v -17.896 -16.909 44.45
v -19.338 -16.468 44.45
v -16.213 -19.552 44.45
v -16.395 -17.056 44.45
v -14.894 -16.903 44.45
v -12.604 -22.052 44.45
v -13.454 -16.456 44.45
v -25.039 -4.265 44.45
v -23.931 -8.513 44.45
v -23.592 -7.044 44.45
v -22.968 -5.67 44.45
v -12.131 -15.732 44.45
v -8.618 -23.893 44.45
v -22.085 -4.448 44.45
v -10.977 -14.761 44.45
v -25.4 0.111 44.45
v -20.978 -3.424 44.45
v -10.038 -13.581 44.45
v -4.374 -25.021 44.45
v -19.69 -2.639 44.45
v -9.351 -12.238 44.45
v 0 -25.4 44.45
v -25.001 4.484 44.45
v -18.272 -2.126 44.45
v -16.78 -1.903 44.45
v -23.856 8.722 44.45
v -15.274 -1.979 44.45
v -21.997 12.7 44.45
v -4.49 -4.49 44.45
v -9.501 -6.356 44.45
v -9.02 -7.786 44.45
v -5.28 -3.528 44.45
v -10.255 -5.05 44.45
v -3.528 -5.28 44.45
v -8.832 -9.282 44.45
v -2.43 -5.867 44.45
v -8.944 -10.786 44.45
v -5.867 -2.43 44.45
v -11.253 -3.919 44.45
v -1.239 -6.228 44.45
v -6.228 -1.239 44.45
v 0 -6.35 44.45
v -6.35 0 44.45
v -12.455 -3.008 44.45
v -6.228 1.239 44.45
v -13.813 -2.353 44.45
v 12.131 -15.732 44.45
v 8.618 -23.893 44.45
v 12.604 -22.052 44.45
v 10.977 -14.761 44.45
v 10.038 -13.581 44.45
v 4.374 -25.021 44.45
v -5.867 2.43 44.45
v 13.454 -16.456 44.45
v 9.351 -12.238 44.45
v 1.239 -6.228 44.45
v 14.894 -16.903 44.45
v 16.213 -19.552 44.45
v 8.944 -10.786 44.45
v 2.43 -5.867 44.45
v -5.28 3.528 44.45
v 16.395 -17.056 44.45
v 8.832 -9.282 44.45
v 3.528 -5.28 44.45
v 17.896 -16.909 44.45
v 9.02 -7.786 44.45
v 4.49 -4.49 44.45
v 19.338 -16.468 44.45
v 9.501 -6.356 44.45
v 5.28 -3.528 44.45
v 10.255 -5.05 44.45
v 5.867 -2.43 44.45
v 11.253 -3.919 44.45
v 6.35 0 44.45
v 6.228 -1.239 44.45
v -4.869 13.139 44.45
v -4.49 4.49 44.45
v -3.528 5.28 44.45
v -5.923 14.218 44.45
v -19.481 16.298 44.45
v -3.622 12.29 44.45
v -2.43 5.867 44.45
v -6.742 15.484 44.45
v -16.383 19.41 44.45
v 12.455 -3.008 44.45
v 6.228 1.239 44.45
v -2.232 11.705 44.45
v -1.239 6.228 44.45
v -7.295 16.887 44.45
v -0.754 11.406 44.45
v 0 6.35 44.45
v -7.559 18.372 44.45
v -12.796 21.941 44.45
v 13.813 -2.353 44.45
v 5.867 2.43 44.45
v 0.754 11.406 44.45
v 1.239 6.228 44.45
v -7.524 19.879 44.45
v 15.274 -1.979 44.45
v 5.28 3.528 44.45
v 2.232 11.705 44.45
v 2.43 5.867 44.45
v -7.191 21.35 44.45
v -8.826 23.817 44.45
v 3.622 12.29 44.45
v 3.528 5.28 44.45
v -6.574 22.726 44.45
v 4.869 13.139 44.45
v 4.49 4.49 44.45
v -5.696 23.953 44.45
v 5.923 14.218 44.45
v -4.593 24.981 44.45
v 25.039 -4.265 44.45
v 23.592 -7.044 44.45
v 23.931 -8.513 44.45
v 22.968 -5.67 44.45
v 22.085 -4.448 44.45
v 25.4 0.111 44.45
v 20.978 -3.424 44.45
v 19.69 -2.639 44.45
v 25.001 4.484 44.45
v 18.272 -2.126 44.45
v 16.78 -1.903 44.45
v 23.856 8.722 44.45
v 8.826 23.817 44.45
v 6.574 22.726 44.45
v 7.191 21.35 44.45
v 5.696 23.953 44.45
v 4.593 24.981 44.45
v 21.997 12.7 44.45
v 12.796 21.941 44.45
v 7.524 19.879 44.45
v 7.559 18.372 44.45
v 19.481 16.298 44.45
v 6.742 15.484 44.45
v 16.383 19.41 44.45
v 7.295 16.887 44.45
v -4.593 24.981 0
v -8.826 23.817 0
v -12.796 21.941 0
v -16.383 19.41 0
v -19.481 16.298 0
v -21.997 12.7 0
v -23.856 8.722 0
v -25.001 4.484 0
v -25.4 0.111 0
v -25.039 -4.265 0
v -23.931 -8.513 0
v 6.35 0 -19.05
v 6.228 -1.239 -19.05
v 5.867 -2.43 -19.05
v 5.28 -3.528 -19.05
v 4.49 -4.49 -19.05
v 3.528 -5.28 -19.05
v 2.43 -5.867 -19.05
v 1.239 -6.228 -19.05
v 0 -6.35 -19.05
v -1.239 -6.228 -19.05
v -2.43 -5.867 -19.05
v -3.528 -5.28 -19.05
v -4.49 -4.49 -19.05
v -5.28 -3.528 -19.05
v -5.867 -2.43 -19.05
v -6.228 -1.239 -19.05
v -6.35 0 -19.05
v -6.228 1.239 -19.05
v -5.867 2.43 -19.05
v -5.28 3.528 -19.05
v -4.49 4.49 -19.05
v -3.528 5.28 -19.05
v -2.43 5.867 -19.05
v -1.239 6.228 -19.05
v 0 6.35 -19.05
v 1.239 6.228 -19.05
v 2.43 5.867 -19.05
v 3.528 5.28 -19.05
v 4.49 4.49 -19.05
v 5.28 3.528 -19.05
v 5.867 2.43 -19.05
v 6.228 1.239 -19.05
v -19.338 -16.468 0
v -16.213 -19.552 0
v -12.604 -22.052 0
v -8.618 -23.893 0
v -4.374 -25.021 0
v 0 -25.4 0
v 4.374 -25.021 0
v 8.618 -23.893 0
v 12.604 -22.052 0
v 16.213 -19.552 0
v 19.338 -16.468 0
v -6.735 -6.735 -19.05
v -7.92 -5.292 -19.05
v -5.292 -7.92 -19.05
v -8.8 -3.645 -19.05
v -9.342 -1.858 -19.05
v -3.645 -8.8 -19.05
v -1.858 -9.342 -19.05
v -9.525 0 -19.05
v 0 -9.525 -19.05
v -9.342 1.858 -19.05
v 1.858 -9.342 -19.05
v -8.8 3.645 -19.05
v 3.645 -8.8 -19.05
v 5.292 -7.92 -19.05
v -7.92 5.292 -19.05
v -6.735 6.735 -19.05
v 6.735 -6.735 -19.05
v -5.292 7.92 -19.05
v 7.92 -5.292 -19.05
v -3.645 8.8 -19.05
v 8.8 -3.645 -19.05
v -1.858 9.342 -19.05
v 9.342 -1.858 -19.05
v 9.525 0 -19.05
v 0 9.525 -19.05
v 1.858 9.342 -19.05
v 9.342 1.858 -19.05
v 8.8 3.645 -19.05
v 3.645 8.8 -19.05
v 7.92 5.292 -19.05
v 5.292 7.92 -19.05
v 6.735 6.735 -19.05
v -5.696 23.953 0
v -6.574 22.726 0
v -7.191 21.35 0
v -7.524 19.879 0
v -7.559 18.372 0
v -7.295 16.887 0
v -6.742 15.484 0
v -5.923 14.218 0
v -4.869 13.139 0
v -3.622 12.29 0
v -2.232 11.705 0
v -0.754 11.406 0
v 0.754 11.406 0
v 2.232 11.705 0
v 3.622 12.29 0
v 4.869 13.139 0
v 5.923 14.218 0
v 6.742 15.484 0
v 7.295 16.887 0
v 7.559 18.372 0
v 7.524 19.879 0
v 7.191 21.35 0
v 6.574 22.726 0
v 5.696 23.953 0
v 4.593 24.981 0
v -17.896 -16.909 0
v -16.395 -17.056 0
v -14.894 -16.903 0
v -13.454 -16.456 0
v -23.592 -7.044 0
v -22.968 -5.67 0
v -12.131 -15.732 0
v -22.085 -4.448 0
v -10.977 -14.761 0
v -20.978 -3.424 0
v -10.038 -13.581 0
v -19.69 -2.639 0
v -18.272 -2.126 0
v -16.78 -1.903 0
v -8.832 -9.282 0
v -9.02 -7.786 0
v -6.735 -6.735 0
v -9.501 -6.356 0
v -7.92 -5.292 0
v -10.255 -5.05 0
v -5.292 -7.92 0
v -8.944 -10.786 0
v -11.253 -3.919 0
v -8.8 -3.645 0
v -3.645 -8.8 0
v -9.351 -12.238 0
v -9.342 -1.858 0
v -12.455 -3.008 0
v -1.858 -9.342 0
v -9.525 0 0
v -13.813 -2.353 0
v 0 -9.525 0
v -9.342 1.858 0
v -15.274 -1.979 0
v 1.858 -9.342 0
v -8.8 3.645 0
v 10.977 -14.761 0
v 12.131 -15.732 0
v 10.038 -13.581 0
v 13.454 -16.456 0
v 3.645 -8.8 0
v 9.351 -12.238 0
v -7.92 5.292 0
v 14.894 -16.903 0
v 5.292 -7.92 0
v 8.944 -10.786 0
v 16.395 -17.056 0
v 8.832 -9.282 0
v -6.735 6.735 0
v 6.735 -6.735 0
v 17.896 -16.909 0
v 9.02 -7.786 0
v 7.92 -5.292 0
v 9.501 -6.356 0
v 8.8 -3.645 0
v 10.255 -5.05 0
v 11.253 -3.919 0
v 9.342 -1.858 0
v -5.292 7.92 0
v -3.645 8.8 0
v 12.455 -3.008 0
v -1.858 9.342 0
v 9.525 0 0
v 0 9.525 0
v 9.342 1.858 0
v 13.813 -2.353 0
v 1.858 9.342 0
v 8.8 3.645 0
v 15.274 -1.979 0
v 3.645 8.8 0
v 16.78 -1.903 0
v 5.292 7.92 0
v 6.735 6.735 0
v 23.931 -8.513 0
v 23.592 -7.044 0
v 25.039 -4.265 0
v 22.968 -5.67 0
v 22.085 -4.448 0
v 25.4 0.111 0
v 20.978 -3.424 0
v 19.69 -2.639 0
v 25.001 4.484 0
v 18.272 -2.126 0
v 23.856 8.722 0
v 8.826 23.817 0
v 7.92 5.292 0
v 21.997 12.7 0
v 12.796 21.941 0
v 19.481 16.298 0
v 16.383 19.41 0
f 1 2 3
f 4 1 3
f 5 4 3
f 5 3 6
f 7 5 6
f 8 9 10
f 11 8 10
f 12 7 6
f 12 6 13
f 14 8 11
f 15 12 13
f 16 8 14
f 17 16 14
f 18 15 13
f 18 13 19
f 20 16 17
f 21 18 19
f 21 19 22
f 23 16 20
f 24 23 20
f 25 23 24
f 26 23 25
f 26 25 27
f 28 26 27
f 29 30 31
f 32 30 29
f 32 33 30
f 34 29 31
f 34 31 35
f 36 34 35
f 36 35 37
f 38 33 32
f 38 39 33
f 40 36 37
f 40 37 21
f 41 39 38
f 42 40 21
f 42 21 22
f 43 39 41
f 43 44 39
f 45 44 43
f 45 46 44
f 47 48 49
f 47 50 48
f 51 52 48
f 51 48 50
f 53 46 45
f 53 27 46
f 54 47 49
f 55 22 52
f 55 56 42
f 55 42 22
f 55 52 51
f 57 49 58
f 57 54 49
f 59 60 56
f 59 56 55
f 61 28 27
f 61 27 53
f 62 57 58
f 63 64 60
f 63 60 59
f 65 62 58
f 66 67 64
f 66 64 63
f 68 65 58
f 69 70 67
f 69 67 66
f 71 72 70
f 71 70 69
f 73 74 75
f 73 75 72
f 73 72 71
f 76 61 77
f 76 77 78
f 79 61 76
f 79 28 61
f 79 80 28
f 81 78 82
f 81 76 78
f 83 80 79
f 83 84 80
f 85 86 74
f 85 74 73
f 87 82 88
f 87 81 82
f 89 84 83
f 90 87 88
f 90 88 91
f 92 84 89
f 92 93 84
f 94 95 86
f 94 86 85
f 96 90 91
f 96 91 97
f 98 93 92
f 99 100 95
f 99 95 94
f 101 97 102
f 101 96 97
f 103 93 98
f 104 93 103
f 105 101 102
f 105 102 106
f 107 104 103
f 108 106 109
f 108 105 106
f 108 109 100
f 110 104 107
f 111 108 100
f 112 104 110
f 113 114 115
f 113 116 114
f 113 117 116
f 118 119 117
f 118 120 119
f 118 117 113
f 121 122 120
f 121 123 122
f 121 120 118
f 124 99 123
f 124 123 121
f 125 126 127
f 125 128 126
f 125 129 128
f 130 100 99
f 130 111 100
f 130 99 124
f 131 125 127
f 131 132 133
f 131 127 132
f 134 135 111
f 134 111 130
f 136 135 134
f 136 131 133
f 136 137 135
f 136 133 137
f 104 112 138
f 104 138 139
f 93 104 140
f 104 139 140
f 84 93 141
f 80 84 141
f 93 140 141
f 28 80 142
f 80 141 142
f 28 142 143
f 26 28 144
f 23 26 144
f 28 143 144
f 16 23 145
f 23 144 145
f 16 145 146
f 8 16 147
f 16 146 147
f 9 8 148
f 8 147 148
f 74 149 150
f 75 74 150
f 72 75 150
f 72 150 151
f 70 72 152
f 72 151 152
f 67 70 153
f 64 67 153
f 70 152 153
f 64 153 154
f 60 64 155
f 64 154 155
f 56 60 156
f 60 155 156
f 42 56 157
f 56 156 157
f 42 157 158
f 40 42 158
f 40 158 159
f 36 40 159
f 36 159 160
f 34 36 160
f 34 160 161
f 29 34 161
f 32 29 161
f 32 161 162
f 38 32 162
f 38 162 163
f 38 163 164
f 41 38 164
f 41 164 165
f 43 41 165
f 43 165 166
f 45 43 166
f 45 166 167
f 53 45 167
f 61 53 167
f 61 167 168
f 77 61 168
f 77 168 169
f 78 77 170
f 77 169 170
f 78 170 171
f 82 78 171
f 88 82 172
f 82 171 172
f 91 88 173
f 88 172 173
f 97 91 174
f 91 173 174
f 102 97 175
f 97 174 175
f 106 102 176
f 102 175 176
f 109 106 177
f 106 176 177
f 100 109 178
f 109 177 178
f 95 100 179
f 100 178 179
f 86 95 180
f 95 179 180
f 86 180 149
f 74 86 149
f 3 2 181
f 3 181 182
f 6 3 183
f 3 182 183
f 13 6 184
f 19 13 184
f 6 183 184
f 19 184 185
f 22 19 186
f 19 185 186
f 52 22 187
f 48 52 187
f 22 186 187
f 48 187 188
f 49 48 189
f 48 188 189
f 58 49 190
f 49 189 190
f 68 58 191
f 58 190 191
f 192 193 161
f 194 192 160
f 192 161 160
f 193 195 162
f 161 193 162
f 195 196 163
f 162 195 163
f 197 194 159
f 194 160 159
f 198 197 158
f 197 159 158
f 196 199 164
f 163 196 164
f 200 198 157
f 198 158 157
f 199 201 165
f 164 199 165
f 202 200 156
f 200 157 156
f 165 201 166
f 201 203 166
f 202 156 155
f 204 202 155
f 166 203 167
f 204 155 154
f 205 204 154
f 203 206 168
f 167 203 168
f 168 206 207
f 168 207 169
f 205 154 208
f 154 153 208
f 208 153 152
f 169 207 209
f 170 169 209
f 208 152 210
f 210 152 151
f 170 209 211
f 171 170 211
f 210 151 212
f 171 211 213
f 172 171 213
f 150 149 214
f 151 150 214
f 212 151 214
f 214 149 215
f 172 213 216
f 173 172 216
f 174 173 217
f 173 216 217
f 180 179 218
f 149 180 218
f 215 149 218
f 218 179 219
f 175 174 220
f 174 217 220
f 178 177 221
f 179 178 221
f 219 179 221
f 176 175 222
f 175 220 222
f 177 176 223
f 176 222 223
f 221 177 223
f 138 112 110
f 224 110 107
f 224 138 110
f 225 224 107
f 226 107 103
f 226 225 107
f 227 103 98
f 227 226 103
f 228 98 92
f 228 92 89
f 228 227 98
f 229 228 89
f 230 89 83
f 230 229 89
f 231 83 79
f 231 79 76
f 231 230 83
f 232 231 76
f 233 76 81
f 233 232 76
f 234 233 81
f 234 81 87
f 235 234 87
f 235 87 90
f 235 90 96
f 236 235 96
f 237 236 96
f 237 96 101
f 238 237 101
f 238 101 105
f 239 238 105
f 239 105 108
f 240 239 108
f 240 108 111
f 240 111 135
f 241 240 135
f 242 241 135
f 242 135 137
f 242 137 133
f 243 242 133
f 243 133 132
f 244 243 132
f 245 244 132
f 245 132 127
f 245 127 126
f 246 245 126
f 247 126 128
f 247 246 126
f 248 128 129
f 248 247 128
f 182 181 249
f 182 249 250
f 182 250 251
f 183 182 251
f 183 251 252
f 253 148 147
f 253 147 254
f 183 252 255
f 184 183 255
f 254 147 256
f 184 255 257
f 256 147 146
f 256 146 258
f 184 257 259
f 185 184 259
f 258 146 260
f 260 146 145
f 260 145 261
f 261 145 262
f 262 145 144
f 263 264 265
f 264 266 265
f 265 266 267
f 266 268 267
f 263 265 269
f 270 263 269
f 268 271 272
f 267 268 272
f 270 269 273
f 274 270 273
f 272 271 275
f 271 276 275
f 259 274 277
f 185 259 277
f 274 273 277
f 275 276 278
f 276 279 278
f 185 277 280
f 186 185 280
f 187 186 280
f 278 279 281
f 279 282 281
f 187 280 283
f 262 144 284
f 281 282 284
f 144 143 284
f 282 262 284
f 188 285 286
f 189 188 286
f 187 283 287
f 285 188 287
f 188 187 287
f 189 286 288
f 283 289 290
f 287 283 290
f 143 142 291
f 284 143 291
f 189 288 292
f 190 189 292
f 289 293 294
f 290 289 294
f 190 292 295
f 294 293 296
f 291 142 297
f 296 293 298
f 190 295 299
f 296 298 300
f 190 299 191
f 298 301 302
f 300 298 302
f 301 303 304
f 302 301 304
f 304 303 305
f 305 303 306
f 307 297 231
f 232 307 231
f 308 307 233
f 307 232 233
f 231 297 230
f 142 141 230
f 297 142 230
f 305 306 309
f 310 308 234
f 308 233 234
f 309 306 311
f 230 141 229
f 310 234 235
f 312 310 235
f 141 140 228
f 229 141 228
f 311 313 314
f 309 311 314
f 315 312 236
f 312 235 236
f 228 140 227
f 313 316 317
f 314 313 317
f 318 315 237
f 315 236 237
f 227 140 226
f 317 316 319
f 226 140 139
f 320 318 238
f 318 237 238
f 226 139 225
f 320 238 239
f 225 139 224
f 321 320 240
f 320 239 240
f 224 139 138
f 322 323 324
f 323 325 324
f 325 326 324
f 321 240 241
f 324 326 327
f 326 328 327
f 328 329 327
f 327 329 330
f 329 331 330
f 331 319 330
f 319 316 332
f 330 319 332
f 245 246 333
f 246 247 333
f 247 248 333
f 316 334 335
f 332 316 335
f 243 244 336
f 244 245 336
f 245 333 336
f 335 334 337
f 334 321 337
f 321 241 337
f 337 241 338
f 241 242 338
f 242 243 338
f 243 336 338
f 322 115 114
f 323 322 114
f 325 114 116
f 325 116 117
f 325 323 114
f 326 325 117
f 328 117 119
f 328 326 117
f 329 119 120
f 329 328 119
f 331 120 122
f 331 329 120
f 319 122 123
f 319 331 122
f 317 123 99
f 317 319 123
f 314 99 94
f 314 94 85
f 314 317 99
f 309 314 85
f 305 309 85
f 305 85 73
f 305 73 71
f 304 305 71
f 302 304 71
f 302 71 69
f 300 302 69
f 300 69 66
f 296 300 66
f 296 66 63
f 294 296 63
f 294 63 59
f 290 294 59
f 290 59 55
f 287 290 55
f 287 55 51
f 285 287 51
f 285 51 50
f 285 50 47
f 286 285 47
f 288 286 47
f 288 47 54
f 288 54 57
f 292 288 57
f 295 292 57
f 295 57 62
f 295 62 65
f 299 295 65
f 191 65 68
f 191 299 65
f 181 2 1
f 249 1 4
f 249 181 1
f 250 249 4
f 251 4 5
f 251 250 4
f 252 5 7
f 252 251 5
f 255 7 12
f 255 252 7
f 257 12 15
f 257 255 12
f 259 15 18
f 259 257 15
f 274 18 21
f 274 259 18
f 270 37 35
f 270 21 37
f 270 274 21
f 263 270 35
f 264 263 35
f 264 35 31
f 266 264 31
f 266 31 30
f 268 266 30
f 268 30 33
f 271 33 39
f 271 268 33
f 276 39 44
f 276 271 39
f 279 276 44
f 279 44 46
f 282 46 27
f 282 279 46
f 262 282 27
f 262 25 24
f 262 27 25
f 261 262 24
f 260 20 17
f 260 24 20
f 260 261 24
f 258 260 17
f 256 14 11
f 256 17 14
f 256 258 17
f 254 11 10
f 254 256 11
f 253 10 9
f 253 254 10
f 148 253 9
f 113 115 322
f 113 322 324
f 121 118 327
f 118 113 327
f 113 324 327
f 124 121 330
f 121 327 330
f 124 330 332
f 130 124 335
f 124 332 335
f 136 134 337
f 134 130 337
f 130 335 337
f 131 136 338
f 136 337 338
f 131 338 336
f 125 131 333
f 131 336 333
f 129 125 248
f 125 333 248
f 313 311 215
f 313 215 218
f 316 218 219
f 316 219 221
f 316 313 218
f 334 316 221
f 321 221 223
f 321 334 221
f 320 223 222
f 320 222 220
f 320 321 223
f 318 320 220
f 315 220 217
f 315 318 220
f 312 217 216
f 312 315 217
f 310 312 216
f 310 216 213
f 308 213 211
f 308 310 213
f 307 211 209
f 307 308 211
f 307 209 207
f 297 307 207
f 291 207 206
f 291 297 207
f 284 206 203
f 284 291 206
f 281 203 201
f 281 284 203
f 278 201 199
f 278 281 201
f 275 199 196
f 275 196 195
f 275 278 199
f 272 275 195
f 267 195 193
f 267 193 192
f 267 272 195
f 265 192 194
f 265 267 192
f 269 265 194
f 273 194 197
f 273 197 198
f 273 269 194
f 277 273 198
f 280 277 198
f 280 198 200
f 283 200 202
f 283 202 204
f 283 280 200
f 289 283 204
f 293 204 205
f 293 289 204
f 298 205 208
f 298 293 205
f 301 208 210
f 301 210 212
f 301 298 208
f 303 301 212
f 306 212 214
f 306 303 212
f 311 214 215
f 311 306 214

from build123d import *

# Parameters (mm, degrees)
F0_R     = 25.4
F1_DEPTH = 44.45
F2_R     = 9.525
F3_DEPTH = 19.05
F4_R     = 6.35
F5_DEPTH = 76.2
F6_R     = 7.581193
F7_DEPTH = 44.45


with BuildPart() as f1:
    # F0 (on Top) → F1 (new body)
    with BuildSketch(Plane.XY):
        Circle(F0_R)
    extrude(amount=F1_DEPTH)

    # F2 (on Top) → F3 (join)
    with BuildSketch(Plane.XY):
        Circle(F2_R)
    extrude(amount=-F3_DEPTH)

    # F4 (on face) → F5 (cut)
    with BuildSketch(Plane(origin=(0, 0, -19.05), x_dir=(1, 0, 0), z_dir=(0, 0, -1))):
        Circle(F4_R)
    extrude(amount=-F5_DEPTH, mode=Mode.SUBTRACT)

    # F6 (on Top) → F7 (cut)
    with BuildSketch(Plane.XY):
        with Locations((0, 18.949738)):
            Circle(F6_R)
        with Locations((-16.410954, -9.474869)):
            Circle(F6_R)
        with Locations((16.410954, -9.474869)):
            Circle(F6_R)
    extrude(amount=F7_DEPTH, mode=Mode.SUBTRACT)


solid = f1.part
